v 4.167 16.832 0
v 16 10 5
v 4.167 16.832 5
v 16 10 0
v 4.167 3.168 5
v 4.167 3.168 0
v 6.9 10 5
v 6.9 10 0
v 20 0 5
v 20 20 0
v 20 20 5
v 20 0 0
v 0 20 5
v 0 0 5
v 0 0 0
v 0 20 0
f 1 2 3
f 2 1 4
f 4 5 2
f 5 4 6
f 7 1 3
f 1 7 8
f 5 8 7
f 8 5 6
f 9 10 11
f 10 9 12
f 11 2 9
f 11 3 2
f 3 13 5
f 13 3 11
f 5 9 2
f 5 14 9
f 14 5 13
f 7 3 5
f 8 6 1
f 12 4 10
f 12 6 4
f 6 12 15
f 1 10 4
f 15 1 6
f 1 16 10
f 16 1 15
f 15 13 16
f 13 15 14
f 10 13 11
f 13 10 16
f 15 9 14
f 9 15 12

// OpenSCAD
difference() {
	cube([20, 20, 5]);
	difference() {
		translate([8, 10, -1]) {
			cylinder(r=8, h=7, $fn=3);
		}
		translate([3.7, 10, -2]) {
			scale([0.4, 1, 1]) {
				cylinder(r=8, h=9, $fn=4);
			}
		}
	}
}
